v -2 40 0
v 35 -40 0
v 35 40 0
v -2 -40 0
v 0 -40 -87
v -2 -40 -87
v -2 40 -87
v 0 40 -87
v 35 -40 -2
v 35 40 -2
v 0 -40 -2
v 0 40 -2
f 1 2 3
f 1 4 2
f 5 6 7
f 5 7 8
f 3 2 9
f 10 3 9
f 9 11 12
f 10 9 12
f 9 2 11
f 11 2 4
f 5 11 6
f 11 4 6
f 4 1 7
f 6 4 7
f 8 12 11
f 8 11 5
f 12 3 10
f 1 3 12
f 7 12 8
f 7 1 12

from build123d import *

# Parameters (mm, degrees)
SKETCH_1_W      = 2
SKETCH_1_H      = 87
EXTRUDE_1_DEPTH = 40
SKETCH_2_W      = 2
SKETCH_2_H      = 80
EXTRUDE_2_DEPTH = 35


with BuildPart() as part:
    # 草图1 → 凸台-拉伸1 (new body, symmetric)
    with BuildSketch(Plane(origin=(0, 0, 0), x_dir=(1, 0, 0), z_dir=(0, 1, 0))):
        with Locations((-1, 43.5)):
            Rectangle(SKETCH_1_W, SKETCH_1_H)
    extrude(amount=EXTRUDE_1_DEPTH, both=True)

    # 草图2 → 凸台-拉伸2 (add)
    with BuildSketch(Plane(origin=(0, 0, 0), x_dir=(0, 0, -1), z_dir=(1, 0, 0))):
        with Locations((1, 0)):
            Rectangle(SKETCH_2_W, SKETCH_2_H)
    extrude(amount=EXTRUDE_2_DEPTH)


solid = part.part
